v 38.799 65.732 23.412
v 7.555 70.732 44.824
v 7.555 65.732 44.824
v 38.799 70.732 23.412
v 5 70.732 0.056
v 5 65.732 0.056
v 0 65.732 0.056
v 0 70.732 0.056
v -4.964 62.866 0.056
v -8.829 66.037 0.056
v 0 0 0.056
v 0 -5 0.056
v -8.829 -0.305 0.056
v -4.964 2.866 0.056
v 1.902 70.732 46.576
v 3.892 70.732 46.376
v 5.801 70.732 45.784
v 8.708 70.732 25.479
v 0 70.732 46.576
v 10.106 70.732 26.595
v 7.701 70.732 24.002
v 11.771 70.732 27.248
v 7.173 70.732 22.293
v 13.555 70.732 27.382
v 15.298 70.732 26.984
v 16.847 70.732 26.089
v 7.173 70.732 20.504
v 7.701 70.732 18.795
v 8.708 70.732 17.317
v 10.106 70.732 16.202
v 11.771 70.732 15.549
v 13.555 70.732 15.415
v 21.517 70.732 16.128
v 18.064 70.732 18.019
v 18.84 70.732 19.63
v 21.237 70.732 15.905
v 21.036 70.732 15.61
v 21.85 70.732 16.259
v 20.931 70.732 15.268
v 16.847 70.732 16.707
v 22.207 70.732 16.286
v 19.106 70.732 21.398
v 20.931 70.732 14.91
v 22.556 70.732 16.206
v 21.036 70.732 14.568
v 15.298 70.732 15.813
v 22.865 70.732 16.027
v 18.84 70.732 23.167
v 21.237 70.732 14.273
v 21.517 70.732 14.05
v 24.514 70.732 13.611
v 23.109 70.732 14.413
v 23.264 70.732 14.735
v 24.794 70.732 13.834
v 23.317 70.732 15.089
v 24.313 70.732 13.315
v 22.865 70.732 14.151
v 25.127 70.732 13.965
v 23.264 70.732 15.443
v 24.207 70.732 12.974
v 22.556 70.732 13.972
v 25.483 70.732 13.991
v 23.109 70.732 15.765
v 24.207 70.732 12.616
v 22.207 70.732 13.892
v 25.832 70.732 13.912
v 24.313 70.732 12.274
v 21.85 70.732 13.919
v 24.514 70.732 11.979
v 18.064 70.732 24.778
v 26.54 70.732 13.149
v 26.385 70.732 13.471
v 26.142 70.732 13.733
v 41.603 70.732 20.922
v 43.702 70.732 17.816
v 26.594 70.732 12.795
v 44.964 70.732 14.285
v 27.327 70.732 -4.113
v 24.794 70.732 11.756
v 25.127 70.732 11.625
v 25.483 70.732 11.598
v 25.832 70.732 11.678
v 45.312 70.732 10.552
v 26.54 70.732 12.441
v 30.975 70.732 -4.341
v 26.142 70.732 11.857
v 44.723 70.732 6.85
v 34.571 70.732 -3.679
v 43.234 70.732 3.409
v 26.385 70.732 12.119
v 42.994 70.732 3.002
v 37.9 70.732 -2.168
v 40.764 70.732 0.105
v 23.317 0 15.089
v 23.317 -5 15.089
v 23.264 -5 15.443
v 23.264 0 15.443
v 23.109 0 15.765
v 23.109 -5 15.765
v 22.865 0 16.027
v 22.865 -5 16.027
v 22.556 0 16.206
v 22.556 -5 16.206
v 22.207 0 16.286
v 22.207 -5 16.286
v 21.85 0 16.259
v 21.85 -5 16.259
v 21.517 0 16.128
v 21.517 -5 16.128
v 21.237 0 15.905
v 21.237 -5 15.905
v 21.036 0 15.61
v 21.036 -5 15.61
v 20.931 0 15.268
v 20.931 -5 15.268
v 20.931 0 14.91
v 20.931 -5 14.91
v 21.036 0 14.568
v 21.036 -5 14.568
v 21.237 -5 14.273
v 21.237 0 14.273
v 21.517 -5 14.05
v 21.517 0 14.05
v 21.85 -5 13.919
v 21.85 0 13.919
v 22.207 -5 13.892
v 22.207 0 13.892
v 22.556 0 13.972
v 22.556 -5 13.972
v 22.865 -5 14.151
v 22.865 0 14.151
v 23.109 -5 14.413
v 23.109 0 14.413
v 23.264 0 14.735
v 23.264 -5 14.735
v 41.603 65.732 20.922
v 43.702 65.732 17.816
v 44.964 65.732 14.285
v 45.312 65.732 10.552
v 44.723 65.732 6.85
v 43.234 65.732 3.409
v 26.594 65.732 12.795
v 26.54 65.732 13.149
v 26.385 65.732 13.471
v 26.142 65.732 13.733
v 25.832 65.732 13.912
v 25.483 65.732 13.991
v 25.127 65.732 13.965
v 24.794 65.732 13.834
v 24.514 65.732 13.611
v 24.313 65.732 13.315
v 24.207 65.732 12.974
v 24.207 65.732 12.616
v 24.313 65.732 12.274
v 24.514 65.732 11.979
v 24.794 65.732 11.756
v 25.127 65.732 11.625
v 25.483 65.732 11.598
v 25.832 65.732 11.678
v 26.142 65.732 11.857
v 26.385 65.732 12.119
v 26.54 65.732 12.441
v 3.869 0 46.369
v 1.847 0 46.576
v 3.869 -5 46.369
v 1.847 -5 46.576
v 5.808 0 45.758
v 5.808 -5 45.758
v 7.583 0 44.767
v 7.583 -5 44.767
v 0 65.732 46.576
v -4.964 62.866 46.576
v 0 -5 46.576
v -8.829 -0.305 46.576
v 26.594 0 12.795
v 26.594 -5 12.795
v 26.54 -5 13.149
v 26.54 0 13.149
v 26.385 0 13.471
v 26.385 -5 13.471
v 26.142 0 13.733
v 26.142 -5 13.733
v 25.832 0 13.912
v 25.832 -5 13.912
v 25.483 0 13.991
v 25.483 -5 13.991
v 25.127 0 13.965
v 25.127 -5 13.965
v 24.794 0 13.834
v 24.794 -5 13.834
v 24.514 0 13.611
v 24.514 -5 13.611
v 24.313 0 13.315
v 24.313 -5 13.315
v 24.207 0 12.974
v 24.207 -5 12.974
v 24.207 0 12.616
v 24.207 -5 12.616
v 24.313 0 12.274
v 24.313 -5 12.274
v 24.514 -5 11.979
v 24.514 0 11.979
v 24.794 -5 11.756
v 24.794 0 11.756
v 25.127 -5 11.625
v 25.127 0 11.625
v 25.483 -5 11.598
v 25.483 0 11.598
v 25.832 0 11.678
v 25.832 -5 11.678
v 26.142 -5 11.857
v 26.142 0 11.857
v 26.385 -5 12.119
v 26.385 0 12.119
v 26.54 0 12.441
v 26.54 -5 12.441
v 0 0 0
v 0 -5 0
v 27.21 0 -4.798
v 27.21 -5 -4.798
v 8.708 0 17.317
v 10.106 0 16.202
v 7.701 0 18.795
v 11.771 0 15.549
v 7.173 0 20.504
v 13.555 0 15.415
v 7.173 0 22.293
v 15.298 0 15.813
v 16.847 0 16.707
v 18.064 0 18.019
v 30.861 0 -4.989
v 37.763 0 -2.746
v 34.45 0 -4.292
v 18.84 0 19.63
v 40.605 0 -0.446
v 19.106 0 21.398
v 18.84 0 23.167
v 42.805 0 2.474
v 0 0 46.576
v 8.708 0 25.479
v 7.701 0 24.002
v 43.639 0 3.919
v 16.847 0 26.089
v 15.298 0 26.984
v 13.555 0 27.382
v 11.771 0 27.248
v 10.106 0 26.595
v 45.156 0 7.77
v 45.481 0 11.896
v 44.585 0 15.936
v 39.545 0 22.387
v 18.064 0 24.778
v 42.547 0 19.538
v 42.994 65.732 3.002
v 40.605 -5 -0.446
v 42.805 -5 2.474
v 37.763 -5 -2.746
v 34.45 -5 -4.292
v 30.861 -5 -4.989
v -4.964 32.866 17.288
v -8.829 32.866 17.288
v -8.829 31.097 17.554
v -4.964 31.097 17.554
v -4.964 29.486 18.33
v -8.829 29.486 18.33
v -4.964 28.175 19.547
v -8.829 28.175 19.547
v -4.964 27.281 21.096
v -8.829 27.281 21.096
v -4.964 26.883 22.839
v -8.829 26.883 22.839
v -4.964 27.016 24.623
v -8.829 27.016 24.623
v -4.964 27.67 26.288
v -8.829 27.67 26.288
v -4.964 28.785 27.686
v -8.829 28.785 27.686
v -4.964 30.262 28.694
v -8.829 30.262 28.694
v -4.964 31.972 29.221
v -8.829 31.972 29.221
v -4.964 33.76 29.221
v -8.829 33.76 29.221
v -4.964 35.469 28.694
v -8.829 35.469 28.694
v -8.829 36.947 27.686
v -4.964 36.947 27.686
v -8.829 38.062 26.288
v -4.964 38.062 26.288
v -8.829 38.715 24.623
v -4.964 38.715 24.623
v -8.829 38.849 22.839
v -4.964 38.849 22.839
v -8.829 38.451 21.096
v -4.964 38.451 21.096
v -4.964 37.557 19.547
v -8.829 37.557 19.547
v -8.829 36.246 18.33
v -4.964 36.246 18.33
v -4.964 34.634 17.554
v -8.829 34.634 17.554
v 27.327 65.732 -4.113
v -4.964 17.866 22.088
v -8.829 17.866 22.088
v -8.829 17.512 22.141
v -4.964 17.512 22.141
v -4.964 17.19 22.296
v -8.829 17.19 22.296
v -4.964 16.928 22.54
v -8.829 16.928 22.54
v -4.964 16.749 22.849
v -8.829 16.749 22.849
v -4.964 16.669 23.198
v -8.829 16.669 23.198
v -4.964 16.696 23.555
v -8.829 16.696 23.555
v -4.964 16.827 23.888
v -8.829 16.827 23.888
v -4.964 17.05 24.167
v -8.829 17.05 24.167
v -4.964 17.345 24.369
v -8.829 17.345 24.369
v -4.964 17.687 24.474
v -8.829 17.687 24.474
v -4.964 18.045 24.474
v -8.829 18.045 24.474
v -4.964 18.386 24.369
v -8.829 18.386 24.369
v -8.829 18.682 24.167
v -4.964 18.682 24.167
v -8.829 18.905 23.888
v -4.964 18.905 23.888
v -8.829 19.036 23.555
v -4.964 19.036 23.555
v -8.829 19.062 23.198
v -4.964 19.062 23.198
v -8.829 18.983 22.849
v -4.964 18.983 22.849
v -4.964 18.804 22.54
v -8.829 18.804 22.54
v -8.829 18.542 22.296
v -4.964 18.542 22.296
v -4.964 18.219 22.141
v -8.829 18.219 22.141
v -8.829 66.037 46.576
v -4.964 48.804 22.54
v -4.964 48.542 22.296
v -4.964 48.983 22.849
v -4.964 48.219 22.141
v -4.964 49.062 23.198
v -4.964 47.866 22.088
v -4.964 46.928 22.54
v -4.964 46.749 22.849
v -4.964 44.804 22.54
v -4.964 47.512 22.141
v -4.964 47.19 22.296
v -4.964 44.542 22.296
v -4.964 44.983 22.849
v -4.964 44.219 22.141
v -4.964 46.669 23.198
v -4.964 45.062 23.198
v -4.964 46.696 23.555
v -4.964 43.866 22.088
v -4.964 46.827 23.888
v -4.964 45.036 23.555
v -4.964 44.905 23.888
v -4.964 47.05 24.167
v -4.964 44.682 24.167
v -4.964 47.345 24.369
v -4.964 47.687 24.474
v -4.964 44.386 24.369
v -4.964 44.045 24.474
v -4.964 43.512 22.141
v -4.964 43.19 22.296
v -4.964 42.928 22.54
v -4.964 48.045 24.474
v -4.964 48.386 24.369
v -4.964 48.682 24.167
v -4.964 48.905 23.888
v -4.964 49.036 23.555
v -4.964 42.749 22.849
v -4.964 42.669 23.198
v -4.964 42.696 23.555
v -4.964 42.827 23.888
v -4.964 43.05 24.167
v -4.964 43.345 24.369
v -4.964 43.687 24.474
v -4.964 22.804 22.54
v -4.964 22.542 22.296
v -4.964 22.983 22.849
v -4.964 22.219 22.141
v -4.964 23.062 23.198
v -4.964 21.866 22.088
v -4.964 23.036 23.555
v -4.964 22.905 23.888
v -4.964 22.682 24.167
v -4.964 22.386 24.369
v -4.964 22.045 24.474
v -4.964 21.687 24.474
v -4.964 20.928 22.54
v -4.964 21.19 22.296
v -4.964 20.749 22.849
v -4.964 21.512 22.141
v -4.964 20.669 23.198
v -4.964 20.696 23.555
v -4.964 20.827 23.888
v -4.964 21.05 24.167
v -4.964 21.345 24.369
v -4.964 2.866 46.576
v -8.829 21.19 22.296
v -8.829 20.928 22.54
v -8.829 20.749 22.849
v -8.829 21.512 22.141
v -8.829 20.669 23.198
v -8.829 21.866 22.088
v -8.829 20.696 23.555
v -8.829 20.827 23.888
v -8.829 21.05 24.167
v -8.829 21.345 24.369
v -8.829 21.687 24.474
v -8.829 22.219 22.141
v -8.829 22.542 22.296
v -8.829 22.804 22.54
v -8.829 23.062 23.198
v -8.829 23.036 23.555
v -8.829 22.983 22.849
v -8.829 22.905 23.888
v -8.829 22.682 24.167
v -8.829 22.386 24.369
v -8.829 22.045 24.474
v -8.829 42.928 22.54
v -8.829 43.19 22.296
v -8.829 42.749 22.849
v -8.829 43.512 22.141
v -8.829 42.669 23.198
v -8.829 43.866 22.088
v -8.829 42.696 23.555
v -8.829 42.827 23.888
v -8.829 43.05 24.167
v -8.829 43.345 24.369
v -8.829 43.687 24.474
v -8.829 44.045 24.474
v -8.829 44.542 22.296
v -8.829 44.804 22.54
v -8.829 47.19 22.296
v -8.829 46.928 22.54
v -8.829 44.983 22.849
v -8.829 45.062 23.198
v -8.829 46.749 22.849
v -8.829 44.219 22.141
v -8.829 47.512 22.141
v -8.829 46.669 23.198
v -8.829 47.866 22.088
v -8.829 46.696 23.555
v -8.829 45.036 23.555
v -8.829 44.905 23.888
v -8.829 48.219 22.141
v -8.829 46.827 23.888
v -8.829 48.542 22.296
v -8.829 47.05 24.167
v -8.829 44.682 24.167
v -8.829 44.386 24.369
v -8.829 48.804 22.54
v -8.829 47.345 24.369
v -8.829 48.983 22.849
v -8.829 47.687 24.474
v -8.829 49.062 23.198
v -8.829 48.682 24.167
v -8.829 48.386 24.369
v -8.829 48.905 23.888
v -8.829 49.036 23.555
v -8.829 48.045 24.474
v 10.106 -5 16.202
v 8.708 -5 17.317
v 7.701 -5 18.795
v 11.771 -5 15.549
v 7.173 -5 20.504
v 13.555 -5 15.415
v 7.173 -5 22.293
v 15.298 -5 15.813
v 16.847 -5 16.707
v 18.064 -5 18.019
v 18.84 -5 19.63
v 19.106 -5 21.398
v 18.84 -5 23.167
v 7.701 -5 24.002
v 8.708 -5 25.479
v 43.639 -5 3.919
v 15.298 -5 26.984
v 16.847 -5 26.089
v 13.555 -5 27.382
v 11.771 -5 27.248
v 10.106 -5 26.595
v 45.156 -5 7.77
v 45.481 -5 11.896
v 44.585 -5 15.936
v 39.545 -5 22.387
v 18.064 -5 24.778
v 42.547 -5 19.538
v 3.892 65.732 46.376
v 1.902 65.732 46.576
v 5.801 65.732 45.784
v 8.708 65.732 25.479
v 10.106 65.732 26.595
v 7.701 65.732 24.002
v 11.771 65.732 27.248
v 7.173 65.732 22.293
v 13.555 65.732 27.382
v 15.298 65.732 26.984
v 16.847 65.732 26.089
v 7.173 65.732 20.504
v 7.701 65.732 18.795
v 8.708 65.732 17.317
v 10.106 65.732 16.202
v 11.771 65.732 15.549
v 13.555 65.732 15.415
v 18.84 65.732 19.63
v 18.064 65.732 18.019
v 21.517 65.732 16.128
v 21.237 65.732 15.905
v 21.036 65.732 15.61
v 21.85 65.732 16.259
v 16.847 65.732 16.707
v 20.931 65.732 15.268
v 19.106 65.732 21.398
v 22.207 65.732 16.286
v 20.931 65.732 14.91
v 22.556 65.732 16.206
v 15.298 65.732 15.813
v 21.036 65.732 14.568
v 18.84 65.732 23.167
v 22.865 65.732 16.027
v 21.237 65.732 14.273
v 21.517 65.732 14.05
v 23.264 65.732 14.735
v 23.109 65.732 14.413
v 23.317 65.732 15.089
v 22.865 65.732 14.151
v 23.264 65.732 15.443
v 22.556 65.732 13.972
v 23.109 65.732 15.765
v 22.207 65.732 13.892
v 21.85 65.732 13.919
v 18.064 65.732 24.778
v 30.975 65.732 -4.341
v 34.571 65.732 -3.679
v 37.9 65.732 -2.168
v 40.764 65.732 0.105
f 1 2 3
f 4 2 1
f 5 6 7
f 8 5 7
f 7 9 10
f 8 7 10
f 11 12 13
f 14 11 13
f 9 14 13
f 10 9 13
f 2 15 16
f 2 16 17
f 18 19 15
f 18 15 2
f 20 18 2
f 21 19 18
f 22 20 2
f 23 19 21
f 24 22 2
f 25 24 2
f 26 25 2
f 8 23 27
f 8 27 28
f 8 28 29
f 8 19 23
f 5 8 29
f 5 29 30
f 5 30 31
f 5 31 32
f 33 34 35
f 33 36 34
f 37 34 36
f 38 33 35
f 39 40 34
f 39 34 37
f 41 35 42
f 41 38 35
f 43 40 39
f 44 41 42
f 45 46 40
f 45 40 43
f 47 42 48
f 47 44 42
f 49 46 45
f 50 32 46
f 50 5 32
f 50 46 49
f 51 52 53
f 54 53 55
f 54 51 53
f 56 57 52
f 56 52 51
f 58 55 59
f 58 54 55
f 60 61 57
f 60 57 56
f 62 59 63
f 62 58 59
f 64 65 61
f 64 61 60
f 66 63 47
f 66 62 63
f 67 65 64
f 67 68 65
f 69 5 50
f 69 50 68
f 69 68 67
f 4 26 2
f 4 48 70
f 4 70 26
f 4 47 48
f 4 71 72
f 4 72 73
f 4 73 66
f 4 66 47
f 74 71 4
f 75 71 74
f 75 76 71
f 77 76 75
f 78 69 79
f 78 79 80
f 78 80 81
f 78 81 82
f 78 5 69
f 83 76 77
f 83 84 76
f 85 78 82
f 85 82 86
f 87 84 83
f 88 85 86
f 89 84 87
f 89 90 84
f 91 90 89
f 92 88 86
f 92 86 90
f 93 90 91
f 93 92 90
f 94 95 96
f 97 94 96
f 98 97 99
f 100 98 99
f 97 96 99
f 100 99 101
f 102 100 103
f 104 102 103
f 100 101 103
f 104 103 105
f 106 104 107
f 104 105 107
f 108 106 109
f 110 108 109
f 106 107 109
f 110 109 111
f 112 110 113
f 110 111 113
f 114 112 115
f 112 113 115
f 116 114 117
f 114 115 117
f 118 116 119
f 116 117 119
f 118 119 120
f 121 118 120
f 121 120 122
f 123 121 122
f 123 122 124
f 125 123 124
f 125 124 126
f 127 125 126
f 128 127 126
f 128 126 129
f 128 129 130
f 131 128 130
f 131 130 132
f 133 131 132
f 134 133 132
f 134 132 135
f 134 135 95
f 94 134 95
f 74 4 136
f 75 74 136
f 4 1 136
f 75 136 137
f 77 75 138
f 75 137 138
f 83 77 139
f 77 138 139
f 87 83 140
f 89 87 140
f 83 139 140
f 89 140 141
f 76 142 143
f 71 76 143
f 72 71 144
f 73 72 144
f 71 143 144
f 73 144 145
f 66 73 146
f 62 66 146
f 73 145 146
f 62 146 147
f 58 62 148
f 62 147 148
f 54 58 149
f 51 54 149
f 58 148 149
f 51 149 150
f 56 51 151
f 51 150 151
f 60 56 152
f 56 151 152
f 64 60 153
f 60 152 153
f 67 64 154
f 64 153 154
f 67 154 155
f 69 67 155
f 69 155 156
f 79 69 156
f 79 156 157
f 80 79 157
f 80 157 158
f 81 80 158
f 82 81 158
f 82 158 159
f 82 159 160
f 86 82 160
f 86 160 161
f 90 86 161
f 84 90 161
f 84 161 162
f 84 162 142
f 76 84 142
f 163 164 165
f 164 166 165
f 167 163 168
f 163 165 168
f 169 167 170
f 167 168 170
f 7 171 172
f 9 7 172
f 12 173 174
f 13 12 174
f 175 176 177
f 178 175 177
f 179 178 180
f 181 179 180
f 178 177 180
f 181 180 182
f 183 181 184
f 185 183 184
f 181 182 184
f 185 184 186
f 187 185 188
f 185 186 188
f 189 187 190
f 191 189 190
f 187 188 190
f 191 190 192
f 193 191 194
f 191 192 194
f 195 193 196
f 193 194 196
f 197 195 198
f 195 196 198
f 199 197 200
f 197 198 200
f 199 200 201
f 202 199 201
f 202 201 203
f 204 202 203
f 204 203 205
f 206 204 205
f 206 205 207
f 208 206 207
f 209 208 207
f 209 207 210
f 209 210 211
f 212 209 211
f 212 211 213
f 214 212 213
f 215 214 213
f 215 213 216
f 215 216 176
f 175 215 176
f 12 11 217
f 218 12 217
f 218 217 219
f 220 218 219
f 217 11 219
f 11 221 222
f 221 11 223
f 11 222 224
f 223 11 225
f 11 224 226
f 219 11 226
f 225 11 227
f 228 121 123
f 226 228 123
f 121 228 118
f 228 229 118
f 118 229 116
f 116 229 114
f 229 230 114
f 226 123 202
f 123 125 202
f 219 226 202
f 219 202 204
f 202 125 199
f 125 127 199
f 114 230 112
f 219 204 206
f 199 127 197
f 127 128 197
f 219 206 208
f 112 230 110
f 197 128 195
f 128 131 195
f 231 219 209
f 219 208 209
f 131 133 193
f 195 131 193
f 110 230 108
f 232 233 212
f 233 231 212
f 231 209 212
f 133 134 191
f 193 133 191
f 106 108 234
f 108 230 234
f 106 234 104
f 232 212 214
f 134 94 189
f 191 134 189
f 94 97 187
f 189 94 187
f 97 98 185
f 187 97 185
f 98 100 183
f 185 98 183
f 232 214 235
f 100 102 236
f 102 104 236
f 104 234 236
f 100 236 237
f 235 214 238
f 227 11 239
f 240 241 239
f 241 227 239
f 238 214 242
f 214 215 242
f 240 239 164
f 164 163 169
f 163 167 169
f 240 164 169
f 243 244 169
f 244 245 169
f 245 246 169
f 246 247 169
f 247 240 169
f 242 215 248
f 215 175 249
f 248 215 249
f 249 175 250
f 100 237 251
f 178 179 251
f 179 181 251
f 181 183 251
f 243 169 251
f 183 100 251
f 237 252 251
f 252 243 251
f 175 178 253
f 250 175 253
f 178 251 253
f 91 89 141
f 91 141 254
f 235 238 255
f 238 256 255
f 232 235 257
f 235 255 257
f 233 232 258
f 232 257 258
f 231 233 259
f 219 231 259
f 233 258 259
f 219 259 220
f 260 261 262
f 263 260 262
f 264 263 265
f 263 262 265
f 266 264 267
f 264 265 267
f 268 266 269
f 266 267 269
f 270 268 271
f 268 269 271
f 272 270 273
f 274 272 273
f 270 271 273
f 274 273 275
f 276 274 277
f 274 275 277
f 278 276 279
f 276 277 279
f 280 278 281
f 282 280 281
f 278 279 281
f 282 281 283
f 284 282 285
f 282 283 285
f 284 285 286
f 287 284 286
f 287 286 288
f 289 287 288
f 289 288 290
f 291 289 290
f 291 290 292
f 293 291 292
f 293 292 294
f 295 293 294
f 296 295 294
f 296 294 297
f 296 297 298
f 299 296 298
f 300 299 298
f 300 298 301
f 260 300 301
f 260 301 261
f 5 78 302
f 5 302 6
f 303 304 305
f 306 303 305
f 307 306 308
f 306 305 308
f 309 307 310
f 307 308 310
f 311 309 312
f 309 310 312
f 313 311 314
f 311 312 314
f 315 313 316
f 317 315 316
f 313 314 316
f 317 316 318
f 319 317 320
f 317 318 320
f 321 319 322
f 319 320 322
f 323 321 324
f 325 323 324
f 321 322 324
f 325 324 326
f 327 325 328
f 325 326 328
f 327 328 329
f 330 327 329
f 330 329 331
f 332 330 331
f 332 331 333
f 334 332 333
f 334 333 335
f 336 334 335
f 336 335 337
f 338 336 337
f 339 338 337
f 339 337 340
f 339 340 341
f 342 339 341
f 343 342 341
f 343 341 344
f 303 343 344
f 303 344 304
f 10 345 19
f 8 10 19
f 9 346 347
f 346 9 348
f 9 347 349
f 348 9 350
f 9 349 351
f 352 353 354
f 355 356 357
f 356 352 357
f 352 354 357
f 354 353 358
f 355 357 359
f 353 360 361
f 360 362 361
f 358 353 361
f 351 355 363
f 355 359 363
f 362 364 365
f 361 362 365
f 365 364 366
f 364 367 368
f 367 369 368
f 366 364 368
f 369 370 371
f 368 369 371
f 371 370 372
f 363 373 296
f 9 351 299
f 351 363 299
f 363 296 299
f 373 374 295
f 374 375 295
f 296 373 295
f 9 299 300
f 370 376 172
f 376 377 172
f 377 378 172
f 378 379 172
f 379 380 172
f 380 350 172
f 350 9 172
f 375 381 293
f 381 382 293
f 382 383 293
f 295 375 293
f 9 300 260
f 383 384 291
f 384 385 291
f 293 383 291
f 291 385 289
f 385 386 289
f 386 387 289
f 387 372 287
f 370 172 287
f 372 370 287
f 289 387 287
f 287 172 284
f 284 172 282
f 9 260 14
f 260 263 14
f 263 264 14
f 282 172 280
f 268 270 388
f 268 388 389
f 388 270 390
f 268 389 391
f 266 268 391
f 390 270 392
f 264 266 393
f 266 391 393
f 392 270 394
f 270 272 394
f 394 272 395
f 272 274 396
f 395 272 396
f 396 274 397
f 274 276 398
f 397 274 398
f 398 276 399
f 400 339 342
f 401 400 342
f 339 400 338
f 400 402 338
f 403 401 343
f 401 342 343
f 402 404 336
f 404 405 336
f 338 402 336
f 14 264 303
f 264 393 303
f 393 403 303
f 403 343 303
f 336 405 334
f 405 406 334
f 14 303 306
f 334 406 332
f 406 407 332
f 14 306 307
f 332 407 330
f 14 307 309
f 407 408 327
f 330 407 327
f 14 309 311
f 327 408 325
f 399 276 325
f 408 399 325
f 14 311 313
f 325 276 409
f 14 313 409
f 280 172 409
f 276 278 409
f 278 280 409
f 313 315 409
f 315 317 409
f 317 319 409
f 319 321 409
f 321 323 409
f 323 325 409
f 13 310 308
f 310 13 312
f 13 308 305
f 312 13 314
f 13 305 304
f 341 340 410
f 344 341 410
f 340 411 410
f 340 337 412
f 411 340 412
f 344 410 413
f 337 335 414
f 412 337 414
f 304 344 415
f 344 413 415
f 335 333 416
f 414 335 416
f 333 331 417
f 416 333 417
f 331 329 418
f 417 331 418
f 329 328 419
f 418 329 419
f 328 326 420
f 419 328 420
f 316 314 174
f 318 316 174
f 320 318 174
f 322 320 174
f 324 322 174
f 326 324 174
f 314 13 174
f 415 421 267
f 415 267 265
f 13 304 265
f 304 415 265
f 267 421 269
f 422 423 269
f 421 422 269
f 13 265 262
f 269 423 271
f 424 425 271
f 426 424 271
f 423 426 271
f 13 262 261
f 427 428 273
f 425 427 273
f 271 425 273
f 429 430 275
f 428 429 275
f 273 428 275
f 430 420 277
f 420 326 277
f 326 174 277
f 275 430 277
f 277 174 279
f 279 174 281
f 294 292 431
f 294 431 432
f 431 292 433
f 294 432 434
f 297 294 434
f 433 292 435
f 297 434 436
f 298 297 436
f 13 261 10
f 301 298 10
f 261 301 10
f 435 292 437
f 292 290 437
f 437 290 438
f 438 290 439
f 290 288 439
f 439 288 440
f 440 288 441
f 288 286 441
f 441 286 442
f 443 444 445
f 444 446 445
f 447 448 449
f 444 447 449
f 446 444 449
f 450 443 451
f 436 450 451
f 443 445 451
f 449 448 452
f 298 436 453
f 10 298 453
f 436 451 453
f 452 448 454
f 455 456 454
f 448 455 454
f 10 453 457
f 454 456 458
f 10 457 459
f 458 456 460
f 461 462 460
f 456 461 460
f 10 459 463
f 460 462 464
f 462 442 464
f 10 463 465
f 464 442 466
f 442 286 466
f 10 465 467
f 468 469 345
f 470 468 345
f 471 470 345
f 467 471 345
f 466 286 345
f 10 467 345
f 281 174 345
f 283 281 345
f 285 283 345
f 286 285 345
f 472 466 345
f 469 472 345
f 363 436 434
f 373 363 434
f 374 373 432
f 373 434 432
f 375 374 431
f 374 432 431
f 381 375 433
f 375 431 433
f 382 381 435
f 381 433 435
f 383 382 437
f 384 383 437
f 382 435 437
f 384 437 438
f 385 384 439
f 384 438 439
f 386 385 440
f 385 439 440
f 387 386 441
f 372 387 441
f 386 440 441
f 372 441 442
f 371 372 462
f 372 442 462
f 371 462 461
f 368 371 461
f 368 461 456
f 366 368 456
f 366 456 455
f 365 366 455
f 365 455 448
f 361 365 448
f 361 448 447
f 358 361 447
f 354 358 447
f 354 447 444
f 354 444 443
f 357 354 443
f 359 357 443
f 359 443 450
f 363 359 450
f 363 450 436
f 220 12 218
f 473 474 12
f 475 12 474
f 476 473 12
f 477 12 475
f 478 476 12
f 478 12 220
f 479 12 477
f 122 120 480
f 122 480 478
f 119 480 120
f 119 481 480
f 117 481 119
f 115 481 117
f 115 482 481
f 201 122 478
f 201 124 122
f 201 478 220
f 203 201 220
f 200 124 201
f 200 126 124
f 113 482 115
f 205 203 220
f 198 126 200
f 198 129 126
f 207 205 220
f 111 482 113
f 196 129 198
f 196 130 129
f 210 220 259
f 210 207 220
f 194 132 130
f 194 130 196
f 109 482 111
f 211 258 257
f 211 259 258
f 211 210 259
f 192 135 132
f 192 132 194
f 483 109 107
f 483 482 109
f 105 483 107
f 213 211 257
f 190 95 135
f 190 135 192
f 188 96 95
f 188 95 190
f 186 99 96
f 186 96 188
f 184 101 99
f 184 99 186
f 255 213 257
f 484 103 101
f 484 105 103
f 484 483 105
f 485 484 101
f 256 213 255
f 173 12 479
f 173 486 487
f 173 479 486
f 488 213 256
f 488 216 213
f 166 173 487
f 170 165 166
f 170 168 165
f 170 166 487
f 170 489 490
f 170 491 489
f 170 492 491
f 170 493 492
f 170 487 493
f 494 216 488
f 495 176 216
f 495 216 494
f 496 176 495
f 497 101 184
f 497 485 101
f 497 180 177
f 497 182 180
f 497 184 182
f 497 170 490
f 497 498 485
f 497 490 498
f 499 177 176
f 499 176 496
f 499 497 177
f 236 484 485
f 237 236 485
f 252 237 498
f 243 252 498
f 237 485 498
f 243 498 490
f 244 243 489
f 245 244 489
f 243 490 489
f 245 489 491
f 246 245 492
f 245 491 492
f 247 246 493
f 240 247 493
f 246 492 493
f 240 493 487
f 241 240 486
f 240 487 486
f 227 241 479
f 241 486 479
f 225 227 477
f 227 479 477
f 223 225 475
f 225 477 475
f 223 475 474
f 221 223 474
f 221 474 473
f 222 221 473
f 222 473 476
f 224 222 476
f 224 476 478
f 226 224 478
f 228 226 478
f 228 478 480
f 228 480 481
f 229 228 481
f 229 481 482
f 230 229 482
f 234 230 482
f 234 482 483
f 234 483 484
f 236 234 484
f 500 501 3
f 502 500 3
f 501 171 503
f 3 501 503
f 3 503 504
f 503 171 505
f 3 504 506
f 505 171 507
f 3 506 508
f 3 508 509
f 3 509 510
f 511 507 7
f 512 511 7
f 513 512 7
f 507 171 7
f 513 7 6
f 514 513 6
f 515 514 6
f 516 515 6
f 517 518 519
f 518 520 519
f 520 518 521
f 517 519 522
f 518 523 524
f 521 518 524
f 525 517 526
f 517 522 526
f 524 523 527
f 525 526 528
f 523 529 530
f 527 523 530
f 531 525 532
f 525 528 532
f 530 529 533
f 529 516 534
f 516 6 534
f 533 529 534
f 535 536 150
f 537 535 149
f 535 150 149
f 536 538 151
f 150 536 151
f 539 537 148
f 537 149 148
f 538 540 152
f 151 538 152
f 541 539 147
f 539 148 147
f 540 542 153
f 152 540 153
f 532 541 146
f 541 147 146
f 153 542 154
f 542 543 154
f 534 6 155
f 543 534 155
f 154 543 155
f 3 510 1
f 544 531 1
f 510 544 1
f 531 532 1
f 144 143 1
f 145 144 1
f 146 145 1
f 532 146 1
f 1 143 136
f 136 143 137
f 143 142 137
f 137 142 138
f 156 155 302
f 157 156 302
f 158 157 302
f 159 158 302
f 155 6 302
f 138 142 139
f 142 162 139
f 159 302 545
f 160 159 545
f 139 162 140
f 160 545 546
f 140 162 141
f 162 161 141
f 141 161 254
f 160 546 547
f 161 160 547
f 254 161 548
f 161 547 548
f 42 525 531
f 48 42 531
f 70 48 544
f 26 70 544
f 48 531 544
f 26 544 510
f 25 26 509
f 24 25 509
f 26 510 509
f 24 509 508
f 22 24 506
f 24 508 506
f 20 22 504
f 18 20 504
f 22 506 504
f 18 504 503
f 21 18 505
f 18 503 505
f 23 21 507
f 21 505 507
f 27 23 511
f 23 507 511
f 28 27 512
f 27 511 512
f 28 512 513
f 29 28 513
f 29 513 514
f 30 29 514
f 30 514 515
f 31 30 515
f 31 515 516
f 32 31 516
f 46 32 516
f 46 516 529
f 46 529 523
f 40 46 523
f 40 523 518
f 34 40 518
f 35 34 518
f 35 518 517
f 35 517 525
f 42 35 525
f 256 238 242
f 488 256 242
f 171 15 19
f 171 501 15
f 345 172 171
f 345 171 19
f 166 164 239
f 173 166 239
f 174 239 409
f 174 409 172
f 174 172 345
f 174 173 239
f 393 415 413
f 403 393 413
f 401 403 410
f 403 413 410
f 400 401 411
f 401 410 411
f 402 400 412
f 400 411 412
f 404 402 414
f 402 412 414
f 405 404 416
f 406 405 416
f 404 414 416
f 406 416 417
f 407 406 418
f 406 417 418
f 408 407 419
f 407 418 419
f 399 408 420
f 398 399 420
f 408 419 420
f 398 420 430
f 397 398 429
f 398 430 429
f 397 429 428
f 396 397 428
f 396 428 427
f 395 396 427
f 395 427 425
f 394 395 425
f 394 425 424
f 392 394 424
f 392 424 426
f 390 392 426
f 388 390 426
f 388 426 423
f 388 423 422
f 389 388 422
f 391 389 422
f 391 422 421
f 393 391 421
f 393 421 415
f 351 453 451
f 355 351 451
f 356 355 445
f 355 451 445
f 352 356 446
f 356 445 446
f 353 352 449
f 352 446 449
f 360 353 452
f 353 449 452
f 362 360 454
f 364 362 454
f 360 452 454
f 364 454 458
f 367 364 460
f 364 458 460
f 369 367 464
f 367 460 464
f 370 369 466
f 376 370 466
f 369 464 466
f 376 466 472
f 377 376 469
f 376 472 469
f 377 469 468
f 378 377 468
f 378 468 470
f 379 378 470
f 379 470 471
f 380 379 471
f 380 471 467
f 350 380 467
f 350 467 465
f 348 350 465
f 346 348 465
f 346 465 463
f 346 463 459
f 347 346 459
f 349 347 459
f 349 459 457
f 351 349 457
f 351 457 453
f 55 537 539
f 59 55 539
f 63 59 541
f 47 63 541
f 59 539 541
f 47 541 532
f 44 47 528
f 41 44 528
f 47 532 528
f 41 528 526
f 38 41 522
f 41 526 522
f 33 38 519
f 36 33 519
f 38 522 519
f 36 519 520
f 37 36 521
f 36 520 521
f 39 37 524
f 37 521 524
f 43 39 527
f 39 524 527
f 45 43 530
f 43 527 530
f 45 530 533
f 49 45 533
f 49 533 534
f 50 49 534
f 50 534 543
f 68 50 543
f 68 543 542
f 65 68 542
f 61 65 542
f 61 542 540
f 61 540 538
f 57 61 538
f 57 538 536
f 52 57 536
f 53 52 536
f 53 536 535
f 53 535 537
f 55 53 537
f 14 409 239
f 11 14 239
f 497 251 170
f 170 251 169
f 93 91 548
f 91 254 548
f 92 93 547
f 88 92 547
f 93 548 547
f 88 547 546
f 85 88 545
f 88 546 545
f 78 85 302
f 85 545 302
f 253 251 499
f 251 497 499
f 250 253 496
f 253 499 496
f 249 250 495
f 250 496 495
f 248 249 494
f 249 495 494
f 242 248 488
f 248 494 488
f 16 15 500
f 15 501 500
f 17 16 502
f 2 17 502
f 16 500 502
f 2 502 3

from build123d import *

# Parameters (mm, degrees)
PAD_DEPTH       = 5
PAD001_DEPTH    = 46.52
SKETCH002_W     = 5
SKETCH002_H     = 5
PAD002_DEPTH    = 46.52
PAD003_DEPTH    = 5
SKETCH004_R     = 6
SKETCH004_R_2   = 1.2
POCKET_DEPTH    = 5
SKETCH005_R     = 6
SKETCH005_R_2   = 1.2
POCKET001_DEPTH = 75.732575
FILLET_R        = 14
FILLET001_R     = 15
FILLET002_R     = 15
FILLET003_R     = 15
FILLET004_R     = 10
FILLET005_R     = 10


with BuildPart() as part:
    # Sketch → Pad (new body)
    with BuildSketch(Plane.XZ):
        Polygon((0, 0), (37.553362, -6.621671), (50.053362, 15.028964), (5, 46.575668), (0, 46.575668), align=None)
    extrude(amount=PAD_DEPTH)

    # Sketch001 → Pad001 (new body)
    with BuildSketch(Plane(origin=(0, 0, 46.575668), x_dir=(-1, 0, 0), z_dir=(0, 0, 1))):
        Polygon((0, 5), (8.829476, 0.305284), (8.829476, -66.03686), (0, -70.731575), (0, -65.731575), (4.96369, -62.865788), (4.96369, -2.865788), (0, 0), align=None)
    extrude(amount=-PAD001_DEPTH)

    # Sketch002 → Pad002 (new body)
    with BuildSketch(Plane(origin=(0, 0, 46.575668), x_dir=(-1, 0, 0), z_dir=(0, 0, 1))):
        with Locations((-2.5, -68.231575)):
            Rectangle(SKETCH002_W, SKETCH002_H)
    extrude(amount=-PAD002_DEPTH)

    # Sketch003 → Pad003 (new body)
    with BuildSketch(Plane(origin=(0, 70.731575, 0), x_dir=(1, 0, 0), z_dir=(0, 1, 0))):
        Polygon((5, -0.055668), (5, -46.575668), (50.368156, -15.48338), (37.651222, 6.040551), align=None)
    extrude(amount=-PAD003_DEPTH)

    # Sketch004 → Pocket (cut)
    with BuildSketch(Plane(origin=(-8.829476, 0, 0), x_dir=(0, 0, -1), z_dir=(-1, 0, 0))):
        with Locations((-23.287834, -32.865788)):
            Circle(SKETCH004_R)
        with Locations((-23.287834, -21.865788)):
            Circle(SKETCH004_R_2)
        with Locations((-23.287834, -17.865788)):
            Circle(SKETCH004_R_2)
        with Locations((-23.287834, -43.865788)):
            Circle(SKETCH004_R_2)
        with Locations((-23.287834, -47.865788)):
            Circle(SKETCH004_R_2)
    extrude(amount=-POCKET_DEPTH, mode=Mode.SUBTRACT)

    # Sketch005 → Pocket001 (cut, through all)
    with BuildSketch(Plane.XZ.offset(5)):
        with Locations((13.106433, 21.398445)):
            Circle(SKETCH005_R)
        with Locations((22.117105, 15.089104)):
            Circle(SKETCH005_R_2)
        with Locations((25.393713, 12.794799)):
            Circle(SKETCH005_R_2)
    extrude(amount=-POCKET001_DEPTH, mode=Mode.SUBTRACT)

    # Fillet
    fillet_edges = [part.edges().sort_by_distance(p)[0] for p in [
        (50.053362, -2.5, 15.028964),
    ]]
    fillet(fillet_edges, radius=FILLET_R)

    # Fillet001
    fillet001_edges = [part.edges().sort_by_distance(p)[0] for p in [
        (37.553362, -2.5, -6.621671),
    ]]
    fillet(fillet001_edges, radius=FILLET001_R)

    # Fillet002
    fillet002_edges = [part.edges().sort_by_distance(p)[0] for p in [
        (50.368156, 68.231575, 15.48338),
    ]]
    fillet(fillet002_edges, radius=FILLET002_R)

    # Fillet003
    fillet003_edges = [part.edges().sort_by_distance(p)[0] for p in [
        (37.651222, 68.231575, -6.040551),
    ]]
    fillet(fillet003_edges, radius=FILLET003_R)

    # Fillet004
    fillet004_edges = [part.edges().sort_by_distance(p)[0] for p in [
        (5, -2.5, 46.575668),
    ]]
    fillet(fillet004_edges, radius=FILLET004_R)

    # Fillet005
    fillet005_edges = [part.edges().sort_by_distance(p)[0] for p in [
        (5, 68.231575, 46.575668),
    ]]
    fillet(fillet005_edges, radius=FILLET005_R)


solid = part.part
